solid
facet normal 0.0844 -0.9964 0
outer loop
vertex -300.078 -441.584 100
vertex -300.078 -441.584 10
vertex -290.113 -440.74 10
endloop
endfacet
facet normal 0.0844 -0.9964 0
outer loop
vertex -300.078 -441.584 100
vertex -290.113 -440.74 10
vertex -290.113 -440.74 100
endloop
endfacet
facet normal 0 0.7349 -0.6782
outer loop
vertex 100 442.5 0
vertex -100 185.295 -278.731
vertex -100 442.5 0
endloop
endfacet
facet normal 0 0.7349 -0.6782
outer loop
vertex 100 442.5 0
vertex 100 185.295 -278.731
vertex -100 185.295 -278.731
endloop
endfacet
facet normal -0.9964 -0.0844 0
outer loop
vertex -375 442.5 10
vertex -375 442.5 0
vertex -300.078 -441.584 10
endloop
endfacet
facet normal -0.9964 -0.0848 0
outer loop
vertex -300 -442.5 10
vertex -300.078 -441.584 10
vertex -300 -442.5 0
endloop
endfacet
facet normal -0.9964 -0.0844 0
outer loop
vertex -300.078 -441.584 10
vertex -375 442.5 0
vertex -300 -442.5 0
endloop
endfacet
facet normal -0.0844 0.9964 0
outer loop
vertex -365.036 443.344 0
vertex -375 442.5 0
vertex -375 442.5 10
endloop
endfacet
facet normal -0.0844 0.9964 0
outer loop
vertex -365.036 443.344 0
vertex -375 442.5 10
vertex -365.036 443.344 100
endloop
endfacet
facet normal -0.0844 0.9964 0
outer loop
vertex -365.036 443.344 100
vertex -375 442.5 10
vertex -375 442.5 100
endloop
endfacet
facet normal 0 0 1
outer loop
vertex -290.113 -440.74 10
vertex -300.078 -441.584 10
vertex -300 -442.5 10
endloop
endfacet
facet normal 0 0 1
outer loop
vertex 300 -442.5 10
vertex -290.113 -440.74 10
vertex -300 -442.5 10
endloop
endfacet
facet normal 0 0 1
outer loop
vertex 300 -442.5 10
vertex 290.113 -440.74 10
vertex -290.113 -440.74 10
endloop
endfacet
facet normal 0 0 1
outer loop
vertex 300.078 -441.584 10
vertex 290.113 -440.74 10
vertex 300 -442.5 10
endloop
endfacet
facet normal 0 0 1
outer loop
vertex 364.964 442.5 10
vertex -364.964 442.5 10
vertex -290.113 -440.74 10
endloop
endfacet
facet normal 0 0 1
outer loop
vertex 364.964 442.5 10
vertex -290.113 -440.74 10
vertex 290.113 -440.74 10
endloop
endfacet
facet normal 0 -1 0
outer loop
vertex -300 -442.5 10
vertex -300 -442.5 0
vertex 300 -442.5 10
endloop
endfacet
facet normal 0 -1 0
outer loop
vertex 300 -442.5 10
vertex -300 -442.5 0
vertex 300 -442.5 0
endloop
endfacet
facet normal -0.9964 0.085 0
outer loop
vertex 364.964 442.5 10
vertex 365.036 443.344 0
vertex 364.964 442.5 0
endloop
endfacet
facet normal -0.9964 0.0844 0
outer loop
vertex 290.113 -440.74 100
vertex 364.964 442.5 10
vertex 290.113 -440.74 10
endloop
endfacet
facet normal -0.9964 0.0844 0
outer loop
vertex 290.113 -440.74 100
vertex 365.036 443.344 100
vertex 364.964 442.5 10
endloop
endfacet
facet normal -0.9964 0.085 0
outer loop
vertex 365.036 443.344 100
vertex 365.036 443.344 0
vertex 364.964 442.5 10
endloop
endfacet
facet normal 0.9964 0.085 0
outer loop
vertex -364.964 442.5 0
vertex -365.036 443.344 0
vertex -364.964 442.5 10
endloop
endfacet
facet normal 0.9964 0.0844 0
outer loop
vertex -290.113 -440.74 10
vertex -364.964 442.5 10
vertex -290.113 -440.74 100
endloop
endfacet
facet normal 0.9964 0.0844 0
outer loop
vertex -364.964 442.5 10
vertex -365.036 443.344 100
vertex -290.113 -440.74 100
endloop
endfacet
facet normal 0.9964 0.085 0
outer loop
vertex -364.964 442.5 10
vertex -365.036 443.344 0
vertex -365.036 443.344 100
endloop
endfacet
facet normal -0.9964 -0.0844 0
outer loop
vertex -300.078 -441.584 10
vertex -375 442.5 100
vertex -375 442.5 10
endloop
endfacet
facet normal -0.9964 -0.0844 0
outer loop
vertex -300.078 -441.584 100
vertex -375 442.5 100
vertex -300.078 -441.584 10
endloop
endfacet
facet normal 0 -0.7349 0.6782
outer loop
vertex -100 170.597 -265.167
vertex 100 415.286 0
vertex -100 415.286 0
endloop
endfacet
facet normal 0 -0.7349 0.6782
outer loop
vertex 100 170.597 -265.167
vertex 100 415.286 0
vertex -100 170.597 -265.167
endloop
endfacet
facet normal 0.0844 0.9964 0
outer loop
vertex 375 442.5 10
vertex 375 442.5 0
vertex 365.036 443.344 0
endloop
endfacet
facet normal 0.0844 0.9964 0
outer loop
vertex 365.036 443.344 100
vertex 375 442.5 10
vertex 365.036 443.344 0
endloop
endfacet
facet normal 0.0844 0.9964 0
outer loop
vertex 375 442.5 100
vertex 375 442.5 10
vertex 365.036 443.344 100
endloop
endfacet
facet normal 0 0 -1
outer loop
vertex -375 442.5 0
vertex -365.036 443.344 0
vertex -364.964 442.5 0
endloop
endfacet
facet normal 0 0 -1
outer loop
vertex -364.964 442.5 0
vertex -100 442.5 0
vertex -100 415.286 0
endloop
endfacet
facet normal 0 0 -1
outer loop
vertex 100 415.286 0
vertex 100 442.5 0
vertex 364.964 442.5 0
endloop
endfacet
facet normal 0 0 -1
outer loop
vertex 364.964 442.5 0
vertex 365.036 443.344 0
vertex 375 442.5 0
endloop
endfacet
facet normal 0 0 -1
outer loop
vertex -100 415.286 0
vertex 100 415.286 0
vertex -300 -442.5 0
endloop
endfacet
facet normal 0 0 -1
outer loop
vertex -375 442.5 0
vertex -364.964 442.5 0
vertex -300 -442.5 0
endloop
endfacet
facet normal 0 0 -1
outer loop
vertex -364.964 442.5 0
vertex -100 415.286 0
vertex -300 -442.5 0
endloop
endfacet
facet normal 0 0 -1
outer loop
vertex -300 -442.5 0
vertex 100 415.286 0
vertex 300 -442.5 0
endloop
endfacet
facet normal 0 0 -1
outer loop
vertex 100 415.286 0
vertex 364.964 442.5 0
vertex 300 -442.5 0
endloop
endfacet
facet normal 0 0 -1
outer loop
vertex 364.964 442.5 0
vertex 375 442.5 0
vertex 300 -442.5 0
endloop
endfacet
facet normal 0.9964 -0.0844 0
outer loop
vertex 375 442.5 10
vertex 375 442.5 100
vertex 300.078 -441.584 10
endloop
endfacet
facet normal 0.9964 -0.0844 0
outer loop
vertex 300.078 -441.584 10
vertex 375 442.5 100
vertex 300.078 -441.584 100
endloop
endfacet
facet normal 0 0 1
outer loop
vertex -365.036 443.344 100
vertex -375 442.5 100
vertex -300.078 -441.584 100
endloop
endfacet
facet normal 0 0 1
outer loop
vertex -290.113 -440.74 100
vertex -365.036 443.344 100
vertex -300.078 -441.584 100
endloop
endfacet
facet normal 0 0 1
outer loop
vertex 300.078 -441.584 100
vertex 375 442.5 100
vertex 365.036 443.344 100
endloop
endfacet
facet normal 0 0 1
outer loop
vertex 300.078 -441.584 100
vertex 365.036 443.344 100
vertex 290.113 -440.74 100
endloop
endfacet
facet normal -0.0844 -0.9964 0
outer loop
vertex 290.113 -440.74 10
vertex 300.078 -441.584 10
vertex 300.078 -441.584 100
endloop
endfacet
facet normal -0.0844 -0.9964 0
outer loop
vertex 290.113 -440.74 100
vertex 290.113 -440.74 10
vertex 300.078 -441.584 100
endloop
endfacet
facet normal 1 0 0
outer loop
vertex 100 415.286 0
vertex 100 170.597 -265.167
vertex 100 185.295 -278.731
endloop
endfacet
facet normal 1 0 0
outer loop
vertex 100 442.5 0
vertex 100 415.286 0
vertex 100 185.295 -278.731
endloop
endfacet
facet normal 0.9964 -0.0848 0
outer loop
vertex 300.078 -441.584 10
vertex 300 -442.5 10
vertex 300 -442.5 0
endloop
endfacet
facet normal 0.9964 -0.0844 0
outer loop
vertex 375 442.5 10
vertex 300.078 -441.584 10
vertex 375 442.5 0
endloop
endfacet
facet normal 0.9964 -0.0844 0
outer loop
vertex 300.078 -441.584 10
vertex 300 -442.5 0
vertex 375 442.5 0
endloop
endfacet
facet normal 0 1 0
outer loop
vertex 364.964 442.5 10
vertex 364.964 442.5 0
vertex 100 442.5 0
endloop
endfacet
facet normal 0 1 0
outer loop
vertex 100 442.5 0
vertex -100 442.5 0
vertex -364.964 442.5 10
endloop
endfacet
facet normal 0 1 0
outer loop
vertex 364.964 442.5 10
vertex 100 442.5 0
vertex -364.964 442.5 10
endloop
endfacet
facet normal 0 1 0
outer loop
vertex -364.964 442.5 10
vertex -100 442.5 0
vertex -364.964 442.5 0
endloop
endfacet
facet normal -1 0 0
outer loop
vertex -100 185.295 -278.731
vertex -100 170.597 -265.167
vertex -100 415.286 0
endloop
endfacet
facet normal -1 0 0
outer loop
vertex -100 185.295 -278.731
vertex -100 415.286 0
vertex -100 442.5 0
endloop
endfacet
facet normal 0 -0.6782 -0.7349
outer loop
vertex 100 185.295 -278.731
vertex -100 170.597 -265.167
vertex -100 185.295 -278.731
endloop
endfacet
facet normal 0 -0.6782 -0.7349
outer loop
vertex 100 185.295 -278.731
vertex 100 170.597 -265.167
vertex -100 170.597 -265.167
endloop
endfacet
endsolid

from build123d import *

# Parameters (mm, degrees)
F1_DEPTH = 10
F2_W     = 887.253195621
F2_H     = 100
F3_DEPTH = 10
F6_DEPTH = 100


with BuildPart() as f1:
    # F0 (on Top) → F1 (new body)
    with BuildSketch(Plane.XY):
        Polygon((-300, -442.5), (300, -442.5), (375, 442.5), (300, 442.5), (-300, 442.5), (-375, 442.5), align=None)
    extrude(amount=F1_DEPTH)

    # F2 (on face) → F3 (join)
    with BuildSketch(Plane(origin=(-335.0934112949, -28.3977467199, 0), x_dir=(0.0844430767, -0.9964283049, 0), z_dir=(-0.9964283049, -0.0844430767, 0))):
        with Locations((-28.9590808637, 50)):
            Rectangle(F2_W, F2_H)
    extrude(amount=-F3_DEPTH)

    # F4: F1 across plane


with BuildPart() as f1_1:
    add(f1.part)
    add(f1.part.mirror(Plane.YZ))

    # F5 (on Right) → F6 (join, symmetric)
    with BuildSketch(Plane.YZ):
        Polygon((185.2948494855, -278.7305519032), (442.5, 0), (415.2859534537, 0), (170.5965575825, -265.1673585059), align=None)
    extrude(amount=F6_DEPTH, both=True)


solid = f1_1.part
